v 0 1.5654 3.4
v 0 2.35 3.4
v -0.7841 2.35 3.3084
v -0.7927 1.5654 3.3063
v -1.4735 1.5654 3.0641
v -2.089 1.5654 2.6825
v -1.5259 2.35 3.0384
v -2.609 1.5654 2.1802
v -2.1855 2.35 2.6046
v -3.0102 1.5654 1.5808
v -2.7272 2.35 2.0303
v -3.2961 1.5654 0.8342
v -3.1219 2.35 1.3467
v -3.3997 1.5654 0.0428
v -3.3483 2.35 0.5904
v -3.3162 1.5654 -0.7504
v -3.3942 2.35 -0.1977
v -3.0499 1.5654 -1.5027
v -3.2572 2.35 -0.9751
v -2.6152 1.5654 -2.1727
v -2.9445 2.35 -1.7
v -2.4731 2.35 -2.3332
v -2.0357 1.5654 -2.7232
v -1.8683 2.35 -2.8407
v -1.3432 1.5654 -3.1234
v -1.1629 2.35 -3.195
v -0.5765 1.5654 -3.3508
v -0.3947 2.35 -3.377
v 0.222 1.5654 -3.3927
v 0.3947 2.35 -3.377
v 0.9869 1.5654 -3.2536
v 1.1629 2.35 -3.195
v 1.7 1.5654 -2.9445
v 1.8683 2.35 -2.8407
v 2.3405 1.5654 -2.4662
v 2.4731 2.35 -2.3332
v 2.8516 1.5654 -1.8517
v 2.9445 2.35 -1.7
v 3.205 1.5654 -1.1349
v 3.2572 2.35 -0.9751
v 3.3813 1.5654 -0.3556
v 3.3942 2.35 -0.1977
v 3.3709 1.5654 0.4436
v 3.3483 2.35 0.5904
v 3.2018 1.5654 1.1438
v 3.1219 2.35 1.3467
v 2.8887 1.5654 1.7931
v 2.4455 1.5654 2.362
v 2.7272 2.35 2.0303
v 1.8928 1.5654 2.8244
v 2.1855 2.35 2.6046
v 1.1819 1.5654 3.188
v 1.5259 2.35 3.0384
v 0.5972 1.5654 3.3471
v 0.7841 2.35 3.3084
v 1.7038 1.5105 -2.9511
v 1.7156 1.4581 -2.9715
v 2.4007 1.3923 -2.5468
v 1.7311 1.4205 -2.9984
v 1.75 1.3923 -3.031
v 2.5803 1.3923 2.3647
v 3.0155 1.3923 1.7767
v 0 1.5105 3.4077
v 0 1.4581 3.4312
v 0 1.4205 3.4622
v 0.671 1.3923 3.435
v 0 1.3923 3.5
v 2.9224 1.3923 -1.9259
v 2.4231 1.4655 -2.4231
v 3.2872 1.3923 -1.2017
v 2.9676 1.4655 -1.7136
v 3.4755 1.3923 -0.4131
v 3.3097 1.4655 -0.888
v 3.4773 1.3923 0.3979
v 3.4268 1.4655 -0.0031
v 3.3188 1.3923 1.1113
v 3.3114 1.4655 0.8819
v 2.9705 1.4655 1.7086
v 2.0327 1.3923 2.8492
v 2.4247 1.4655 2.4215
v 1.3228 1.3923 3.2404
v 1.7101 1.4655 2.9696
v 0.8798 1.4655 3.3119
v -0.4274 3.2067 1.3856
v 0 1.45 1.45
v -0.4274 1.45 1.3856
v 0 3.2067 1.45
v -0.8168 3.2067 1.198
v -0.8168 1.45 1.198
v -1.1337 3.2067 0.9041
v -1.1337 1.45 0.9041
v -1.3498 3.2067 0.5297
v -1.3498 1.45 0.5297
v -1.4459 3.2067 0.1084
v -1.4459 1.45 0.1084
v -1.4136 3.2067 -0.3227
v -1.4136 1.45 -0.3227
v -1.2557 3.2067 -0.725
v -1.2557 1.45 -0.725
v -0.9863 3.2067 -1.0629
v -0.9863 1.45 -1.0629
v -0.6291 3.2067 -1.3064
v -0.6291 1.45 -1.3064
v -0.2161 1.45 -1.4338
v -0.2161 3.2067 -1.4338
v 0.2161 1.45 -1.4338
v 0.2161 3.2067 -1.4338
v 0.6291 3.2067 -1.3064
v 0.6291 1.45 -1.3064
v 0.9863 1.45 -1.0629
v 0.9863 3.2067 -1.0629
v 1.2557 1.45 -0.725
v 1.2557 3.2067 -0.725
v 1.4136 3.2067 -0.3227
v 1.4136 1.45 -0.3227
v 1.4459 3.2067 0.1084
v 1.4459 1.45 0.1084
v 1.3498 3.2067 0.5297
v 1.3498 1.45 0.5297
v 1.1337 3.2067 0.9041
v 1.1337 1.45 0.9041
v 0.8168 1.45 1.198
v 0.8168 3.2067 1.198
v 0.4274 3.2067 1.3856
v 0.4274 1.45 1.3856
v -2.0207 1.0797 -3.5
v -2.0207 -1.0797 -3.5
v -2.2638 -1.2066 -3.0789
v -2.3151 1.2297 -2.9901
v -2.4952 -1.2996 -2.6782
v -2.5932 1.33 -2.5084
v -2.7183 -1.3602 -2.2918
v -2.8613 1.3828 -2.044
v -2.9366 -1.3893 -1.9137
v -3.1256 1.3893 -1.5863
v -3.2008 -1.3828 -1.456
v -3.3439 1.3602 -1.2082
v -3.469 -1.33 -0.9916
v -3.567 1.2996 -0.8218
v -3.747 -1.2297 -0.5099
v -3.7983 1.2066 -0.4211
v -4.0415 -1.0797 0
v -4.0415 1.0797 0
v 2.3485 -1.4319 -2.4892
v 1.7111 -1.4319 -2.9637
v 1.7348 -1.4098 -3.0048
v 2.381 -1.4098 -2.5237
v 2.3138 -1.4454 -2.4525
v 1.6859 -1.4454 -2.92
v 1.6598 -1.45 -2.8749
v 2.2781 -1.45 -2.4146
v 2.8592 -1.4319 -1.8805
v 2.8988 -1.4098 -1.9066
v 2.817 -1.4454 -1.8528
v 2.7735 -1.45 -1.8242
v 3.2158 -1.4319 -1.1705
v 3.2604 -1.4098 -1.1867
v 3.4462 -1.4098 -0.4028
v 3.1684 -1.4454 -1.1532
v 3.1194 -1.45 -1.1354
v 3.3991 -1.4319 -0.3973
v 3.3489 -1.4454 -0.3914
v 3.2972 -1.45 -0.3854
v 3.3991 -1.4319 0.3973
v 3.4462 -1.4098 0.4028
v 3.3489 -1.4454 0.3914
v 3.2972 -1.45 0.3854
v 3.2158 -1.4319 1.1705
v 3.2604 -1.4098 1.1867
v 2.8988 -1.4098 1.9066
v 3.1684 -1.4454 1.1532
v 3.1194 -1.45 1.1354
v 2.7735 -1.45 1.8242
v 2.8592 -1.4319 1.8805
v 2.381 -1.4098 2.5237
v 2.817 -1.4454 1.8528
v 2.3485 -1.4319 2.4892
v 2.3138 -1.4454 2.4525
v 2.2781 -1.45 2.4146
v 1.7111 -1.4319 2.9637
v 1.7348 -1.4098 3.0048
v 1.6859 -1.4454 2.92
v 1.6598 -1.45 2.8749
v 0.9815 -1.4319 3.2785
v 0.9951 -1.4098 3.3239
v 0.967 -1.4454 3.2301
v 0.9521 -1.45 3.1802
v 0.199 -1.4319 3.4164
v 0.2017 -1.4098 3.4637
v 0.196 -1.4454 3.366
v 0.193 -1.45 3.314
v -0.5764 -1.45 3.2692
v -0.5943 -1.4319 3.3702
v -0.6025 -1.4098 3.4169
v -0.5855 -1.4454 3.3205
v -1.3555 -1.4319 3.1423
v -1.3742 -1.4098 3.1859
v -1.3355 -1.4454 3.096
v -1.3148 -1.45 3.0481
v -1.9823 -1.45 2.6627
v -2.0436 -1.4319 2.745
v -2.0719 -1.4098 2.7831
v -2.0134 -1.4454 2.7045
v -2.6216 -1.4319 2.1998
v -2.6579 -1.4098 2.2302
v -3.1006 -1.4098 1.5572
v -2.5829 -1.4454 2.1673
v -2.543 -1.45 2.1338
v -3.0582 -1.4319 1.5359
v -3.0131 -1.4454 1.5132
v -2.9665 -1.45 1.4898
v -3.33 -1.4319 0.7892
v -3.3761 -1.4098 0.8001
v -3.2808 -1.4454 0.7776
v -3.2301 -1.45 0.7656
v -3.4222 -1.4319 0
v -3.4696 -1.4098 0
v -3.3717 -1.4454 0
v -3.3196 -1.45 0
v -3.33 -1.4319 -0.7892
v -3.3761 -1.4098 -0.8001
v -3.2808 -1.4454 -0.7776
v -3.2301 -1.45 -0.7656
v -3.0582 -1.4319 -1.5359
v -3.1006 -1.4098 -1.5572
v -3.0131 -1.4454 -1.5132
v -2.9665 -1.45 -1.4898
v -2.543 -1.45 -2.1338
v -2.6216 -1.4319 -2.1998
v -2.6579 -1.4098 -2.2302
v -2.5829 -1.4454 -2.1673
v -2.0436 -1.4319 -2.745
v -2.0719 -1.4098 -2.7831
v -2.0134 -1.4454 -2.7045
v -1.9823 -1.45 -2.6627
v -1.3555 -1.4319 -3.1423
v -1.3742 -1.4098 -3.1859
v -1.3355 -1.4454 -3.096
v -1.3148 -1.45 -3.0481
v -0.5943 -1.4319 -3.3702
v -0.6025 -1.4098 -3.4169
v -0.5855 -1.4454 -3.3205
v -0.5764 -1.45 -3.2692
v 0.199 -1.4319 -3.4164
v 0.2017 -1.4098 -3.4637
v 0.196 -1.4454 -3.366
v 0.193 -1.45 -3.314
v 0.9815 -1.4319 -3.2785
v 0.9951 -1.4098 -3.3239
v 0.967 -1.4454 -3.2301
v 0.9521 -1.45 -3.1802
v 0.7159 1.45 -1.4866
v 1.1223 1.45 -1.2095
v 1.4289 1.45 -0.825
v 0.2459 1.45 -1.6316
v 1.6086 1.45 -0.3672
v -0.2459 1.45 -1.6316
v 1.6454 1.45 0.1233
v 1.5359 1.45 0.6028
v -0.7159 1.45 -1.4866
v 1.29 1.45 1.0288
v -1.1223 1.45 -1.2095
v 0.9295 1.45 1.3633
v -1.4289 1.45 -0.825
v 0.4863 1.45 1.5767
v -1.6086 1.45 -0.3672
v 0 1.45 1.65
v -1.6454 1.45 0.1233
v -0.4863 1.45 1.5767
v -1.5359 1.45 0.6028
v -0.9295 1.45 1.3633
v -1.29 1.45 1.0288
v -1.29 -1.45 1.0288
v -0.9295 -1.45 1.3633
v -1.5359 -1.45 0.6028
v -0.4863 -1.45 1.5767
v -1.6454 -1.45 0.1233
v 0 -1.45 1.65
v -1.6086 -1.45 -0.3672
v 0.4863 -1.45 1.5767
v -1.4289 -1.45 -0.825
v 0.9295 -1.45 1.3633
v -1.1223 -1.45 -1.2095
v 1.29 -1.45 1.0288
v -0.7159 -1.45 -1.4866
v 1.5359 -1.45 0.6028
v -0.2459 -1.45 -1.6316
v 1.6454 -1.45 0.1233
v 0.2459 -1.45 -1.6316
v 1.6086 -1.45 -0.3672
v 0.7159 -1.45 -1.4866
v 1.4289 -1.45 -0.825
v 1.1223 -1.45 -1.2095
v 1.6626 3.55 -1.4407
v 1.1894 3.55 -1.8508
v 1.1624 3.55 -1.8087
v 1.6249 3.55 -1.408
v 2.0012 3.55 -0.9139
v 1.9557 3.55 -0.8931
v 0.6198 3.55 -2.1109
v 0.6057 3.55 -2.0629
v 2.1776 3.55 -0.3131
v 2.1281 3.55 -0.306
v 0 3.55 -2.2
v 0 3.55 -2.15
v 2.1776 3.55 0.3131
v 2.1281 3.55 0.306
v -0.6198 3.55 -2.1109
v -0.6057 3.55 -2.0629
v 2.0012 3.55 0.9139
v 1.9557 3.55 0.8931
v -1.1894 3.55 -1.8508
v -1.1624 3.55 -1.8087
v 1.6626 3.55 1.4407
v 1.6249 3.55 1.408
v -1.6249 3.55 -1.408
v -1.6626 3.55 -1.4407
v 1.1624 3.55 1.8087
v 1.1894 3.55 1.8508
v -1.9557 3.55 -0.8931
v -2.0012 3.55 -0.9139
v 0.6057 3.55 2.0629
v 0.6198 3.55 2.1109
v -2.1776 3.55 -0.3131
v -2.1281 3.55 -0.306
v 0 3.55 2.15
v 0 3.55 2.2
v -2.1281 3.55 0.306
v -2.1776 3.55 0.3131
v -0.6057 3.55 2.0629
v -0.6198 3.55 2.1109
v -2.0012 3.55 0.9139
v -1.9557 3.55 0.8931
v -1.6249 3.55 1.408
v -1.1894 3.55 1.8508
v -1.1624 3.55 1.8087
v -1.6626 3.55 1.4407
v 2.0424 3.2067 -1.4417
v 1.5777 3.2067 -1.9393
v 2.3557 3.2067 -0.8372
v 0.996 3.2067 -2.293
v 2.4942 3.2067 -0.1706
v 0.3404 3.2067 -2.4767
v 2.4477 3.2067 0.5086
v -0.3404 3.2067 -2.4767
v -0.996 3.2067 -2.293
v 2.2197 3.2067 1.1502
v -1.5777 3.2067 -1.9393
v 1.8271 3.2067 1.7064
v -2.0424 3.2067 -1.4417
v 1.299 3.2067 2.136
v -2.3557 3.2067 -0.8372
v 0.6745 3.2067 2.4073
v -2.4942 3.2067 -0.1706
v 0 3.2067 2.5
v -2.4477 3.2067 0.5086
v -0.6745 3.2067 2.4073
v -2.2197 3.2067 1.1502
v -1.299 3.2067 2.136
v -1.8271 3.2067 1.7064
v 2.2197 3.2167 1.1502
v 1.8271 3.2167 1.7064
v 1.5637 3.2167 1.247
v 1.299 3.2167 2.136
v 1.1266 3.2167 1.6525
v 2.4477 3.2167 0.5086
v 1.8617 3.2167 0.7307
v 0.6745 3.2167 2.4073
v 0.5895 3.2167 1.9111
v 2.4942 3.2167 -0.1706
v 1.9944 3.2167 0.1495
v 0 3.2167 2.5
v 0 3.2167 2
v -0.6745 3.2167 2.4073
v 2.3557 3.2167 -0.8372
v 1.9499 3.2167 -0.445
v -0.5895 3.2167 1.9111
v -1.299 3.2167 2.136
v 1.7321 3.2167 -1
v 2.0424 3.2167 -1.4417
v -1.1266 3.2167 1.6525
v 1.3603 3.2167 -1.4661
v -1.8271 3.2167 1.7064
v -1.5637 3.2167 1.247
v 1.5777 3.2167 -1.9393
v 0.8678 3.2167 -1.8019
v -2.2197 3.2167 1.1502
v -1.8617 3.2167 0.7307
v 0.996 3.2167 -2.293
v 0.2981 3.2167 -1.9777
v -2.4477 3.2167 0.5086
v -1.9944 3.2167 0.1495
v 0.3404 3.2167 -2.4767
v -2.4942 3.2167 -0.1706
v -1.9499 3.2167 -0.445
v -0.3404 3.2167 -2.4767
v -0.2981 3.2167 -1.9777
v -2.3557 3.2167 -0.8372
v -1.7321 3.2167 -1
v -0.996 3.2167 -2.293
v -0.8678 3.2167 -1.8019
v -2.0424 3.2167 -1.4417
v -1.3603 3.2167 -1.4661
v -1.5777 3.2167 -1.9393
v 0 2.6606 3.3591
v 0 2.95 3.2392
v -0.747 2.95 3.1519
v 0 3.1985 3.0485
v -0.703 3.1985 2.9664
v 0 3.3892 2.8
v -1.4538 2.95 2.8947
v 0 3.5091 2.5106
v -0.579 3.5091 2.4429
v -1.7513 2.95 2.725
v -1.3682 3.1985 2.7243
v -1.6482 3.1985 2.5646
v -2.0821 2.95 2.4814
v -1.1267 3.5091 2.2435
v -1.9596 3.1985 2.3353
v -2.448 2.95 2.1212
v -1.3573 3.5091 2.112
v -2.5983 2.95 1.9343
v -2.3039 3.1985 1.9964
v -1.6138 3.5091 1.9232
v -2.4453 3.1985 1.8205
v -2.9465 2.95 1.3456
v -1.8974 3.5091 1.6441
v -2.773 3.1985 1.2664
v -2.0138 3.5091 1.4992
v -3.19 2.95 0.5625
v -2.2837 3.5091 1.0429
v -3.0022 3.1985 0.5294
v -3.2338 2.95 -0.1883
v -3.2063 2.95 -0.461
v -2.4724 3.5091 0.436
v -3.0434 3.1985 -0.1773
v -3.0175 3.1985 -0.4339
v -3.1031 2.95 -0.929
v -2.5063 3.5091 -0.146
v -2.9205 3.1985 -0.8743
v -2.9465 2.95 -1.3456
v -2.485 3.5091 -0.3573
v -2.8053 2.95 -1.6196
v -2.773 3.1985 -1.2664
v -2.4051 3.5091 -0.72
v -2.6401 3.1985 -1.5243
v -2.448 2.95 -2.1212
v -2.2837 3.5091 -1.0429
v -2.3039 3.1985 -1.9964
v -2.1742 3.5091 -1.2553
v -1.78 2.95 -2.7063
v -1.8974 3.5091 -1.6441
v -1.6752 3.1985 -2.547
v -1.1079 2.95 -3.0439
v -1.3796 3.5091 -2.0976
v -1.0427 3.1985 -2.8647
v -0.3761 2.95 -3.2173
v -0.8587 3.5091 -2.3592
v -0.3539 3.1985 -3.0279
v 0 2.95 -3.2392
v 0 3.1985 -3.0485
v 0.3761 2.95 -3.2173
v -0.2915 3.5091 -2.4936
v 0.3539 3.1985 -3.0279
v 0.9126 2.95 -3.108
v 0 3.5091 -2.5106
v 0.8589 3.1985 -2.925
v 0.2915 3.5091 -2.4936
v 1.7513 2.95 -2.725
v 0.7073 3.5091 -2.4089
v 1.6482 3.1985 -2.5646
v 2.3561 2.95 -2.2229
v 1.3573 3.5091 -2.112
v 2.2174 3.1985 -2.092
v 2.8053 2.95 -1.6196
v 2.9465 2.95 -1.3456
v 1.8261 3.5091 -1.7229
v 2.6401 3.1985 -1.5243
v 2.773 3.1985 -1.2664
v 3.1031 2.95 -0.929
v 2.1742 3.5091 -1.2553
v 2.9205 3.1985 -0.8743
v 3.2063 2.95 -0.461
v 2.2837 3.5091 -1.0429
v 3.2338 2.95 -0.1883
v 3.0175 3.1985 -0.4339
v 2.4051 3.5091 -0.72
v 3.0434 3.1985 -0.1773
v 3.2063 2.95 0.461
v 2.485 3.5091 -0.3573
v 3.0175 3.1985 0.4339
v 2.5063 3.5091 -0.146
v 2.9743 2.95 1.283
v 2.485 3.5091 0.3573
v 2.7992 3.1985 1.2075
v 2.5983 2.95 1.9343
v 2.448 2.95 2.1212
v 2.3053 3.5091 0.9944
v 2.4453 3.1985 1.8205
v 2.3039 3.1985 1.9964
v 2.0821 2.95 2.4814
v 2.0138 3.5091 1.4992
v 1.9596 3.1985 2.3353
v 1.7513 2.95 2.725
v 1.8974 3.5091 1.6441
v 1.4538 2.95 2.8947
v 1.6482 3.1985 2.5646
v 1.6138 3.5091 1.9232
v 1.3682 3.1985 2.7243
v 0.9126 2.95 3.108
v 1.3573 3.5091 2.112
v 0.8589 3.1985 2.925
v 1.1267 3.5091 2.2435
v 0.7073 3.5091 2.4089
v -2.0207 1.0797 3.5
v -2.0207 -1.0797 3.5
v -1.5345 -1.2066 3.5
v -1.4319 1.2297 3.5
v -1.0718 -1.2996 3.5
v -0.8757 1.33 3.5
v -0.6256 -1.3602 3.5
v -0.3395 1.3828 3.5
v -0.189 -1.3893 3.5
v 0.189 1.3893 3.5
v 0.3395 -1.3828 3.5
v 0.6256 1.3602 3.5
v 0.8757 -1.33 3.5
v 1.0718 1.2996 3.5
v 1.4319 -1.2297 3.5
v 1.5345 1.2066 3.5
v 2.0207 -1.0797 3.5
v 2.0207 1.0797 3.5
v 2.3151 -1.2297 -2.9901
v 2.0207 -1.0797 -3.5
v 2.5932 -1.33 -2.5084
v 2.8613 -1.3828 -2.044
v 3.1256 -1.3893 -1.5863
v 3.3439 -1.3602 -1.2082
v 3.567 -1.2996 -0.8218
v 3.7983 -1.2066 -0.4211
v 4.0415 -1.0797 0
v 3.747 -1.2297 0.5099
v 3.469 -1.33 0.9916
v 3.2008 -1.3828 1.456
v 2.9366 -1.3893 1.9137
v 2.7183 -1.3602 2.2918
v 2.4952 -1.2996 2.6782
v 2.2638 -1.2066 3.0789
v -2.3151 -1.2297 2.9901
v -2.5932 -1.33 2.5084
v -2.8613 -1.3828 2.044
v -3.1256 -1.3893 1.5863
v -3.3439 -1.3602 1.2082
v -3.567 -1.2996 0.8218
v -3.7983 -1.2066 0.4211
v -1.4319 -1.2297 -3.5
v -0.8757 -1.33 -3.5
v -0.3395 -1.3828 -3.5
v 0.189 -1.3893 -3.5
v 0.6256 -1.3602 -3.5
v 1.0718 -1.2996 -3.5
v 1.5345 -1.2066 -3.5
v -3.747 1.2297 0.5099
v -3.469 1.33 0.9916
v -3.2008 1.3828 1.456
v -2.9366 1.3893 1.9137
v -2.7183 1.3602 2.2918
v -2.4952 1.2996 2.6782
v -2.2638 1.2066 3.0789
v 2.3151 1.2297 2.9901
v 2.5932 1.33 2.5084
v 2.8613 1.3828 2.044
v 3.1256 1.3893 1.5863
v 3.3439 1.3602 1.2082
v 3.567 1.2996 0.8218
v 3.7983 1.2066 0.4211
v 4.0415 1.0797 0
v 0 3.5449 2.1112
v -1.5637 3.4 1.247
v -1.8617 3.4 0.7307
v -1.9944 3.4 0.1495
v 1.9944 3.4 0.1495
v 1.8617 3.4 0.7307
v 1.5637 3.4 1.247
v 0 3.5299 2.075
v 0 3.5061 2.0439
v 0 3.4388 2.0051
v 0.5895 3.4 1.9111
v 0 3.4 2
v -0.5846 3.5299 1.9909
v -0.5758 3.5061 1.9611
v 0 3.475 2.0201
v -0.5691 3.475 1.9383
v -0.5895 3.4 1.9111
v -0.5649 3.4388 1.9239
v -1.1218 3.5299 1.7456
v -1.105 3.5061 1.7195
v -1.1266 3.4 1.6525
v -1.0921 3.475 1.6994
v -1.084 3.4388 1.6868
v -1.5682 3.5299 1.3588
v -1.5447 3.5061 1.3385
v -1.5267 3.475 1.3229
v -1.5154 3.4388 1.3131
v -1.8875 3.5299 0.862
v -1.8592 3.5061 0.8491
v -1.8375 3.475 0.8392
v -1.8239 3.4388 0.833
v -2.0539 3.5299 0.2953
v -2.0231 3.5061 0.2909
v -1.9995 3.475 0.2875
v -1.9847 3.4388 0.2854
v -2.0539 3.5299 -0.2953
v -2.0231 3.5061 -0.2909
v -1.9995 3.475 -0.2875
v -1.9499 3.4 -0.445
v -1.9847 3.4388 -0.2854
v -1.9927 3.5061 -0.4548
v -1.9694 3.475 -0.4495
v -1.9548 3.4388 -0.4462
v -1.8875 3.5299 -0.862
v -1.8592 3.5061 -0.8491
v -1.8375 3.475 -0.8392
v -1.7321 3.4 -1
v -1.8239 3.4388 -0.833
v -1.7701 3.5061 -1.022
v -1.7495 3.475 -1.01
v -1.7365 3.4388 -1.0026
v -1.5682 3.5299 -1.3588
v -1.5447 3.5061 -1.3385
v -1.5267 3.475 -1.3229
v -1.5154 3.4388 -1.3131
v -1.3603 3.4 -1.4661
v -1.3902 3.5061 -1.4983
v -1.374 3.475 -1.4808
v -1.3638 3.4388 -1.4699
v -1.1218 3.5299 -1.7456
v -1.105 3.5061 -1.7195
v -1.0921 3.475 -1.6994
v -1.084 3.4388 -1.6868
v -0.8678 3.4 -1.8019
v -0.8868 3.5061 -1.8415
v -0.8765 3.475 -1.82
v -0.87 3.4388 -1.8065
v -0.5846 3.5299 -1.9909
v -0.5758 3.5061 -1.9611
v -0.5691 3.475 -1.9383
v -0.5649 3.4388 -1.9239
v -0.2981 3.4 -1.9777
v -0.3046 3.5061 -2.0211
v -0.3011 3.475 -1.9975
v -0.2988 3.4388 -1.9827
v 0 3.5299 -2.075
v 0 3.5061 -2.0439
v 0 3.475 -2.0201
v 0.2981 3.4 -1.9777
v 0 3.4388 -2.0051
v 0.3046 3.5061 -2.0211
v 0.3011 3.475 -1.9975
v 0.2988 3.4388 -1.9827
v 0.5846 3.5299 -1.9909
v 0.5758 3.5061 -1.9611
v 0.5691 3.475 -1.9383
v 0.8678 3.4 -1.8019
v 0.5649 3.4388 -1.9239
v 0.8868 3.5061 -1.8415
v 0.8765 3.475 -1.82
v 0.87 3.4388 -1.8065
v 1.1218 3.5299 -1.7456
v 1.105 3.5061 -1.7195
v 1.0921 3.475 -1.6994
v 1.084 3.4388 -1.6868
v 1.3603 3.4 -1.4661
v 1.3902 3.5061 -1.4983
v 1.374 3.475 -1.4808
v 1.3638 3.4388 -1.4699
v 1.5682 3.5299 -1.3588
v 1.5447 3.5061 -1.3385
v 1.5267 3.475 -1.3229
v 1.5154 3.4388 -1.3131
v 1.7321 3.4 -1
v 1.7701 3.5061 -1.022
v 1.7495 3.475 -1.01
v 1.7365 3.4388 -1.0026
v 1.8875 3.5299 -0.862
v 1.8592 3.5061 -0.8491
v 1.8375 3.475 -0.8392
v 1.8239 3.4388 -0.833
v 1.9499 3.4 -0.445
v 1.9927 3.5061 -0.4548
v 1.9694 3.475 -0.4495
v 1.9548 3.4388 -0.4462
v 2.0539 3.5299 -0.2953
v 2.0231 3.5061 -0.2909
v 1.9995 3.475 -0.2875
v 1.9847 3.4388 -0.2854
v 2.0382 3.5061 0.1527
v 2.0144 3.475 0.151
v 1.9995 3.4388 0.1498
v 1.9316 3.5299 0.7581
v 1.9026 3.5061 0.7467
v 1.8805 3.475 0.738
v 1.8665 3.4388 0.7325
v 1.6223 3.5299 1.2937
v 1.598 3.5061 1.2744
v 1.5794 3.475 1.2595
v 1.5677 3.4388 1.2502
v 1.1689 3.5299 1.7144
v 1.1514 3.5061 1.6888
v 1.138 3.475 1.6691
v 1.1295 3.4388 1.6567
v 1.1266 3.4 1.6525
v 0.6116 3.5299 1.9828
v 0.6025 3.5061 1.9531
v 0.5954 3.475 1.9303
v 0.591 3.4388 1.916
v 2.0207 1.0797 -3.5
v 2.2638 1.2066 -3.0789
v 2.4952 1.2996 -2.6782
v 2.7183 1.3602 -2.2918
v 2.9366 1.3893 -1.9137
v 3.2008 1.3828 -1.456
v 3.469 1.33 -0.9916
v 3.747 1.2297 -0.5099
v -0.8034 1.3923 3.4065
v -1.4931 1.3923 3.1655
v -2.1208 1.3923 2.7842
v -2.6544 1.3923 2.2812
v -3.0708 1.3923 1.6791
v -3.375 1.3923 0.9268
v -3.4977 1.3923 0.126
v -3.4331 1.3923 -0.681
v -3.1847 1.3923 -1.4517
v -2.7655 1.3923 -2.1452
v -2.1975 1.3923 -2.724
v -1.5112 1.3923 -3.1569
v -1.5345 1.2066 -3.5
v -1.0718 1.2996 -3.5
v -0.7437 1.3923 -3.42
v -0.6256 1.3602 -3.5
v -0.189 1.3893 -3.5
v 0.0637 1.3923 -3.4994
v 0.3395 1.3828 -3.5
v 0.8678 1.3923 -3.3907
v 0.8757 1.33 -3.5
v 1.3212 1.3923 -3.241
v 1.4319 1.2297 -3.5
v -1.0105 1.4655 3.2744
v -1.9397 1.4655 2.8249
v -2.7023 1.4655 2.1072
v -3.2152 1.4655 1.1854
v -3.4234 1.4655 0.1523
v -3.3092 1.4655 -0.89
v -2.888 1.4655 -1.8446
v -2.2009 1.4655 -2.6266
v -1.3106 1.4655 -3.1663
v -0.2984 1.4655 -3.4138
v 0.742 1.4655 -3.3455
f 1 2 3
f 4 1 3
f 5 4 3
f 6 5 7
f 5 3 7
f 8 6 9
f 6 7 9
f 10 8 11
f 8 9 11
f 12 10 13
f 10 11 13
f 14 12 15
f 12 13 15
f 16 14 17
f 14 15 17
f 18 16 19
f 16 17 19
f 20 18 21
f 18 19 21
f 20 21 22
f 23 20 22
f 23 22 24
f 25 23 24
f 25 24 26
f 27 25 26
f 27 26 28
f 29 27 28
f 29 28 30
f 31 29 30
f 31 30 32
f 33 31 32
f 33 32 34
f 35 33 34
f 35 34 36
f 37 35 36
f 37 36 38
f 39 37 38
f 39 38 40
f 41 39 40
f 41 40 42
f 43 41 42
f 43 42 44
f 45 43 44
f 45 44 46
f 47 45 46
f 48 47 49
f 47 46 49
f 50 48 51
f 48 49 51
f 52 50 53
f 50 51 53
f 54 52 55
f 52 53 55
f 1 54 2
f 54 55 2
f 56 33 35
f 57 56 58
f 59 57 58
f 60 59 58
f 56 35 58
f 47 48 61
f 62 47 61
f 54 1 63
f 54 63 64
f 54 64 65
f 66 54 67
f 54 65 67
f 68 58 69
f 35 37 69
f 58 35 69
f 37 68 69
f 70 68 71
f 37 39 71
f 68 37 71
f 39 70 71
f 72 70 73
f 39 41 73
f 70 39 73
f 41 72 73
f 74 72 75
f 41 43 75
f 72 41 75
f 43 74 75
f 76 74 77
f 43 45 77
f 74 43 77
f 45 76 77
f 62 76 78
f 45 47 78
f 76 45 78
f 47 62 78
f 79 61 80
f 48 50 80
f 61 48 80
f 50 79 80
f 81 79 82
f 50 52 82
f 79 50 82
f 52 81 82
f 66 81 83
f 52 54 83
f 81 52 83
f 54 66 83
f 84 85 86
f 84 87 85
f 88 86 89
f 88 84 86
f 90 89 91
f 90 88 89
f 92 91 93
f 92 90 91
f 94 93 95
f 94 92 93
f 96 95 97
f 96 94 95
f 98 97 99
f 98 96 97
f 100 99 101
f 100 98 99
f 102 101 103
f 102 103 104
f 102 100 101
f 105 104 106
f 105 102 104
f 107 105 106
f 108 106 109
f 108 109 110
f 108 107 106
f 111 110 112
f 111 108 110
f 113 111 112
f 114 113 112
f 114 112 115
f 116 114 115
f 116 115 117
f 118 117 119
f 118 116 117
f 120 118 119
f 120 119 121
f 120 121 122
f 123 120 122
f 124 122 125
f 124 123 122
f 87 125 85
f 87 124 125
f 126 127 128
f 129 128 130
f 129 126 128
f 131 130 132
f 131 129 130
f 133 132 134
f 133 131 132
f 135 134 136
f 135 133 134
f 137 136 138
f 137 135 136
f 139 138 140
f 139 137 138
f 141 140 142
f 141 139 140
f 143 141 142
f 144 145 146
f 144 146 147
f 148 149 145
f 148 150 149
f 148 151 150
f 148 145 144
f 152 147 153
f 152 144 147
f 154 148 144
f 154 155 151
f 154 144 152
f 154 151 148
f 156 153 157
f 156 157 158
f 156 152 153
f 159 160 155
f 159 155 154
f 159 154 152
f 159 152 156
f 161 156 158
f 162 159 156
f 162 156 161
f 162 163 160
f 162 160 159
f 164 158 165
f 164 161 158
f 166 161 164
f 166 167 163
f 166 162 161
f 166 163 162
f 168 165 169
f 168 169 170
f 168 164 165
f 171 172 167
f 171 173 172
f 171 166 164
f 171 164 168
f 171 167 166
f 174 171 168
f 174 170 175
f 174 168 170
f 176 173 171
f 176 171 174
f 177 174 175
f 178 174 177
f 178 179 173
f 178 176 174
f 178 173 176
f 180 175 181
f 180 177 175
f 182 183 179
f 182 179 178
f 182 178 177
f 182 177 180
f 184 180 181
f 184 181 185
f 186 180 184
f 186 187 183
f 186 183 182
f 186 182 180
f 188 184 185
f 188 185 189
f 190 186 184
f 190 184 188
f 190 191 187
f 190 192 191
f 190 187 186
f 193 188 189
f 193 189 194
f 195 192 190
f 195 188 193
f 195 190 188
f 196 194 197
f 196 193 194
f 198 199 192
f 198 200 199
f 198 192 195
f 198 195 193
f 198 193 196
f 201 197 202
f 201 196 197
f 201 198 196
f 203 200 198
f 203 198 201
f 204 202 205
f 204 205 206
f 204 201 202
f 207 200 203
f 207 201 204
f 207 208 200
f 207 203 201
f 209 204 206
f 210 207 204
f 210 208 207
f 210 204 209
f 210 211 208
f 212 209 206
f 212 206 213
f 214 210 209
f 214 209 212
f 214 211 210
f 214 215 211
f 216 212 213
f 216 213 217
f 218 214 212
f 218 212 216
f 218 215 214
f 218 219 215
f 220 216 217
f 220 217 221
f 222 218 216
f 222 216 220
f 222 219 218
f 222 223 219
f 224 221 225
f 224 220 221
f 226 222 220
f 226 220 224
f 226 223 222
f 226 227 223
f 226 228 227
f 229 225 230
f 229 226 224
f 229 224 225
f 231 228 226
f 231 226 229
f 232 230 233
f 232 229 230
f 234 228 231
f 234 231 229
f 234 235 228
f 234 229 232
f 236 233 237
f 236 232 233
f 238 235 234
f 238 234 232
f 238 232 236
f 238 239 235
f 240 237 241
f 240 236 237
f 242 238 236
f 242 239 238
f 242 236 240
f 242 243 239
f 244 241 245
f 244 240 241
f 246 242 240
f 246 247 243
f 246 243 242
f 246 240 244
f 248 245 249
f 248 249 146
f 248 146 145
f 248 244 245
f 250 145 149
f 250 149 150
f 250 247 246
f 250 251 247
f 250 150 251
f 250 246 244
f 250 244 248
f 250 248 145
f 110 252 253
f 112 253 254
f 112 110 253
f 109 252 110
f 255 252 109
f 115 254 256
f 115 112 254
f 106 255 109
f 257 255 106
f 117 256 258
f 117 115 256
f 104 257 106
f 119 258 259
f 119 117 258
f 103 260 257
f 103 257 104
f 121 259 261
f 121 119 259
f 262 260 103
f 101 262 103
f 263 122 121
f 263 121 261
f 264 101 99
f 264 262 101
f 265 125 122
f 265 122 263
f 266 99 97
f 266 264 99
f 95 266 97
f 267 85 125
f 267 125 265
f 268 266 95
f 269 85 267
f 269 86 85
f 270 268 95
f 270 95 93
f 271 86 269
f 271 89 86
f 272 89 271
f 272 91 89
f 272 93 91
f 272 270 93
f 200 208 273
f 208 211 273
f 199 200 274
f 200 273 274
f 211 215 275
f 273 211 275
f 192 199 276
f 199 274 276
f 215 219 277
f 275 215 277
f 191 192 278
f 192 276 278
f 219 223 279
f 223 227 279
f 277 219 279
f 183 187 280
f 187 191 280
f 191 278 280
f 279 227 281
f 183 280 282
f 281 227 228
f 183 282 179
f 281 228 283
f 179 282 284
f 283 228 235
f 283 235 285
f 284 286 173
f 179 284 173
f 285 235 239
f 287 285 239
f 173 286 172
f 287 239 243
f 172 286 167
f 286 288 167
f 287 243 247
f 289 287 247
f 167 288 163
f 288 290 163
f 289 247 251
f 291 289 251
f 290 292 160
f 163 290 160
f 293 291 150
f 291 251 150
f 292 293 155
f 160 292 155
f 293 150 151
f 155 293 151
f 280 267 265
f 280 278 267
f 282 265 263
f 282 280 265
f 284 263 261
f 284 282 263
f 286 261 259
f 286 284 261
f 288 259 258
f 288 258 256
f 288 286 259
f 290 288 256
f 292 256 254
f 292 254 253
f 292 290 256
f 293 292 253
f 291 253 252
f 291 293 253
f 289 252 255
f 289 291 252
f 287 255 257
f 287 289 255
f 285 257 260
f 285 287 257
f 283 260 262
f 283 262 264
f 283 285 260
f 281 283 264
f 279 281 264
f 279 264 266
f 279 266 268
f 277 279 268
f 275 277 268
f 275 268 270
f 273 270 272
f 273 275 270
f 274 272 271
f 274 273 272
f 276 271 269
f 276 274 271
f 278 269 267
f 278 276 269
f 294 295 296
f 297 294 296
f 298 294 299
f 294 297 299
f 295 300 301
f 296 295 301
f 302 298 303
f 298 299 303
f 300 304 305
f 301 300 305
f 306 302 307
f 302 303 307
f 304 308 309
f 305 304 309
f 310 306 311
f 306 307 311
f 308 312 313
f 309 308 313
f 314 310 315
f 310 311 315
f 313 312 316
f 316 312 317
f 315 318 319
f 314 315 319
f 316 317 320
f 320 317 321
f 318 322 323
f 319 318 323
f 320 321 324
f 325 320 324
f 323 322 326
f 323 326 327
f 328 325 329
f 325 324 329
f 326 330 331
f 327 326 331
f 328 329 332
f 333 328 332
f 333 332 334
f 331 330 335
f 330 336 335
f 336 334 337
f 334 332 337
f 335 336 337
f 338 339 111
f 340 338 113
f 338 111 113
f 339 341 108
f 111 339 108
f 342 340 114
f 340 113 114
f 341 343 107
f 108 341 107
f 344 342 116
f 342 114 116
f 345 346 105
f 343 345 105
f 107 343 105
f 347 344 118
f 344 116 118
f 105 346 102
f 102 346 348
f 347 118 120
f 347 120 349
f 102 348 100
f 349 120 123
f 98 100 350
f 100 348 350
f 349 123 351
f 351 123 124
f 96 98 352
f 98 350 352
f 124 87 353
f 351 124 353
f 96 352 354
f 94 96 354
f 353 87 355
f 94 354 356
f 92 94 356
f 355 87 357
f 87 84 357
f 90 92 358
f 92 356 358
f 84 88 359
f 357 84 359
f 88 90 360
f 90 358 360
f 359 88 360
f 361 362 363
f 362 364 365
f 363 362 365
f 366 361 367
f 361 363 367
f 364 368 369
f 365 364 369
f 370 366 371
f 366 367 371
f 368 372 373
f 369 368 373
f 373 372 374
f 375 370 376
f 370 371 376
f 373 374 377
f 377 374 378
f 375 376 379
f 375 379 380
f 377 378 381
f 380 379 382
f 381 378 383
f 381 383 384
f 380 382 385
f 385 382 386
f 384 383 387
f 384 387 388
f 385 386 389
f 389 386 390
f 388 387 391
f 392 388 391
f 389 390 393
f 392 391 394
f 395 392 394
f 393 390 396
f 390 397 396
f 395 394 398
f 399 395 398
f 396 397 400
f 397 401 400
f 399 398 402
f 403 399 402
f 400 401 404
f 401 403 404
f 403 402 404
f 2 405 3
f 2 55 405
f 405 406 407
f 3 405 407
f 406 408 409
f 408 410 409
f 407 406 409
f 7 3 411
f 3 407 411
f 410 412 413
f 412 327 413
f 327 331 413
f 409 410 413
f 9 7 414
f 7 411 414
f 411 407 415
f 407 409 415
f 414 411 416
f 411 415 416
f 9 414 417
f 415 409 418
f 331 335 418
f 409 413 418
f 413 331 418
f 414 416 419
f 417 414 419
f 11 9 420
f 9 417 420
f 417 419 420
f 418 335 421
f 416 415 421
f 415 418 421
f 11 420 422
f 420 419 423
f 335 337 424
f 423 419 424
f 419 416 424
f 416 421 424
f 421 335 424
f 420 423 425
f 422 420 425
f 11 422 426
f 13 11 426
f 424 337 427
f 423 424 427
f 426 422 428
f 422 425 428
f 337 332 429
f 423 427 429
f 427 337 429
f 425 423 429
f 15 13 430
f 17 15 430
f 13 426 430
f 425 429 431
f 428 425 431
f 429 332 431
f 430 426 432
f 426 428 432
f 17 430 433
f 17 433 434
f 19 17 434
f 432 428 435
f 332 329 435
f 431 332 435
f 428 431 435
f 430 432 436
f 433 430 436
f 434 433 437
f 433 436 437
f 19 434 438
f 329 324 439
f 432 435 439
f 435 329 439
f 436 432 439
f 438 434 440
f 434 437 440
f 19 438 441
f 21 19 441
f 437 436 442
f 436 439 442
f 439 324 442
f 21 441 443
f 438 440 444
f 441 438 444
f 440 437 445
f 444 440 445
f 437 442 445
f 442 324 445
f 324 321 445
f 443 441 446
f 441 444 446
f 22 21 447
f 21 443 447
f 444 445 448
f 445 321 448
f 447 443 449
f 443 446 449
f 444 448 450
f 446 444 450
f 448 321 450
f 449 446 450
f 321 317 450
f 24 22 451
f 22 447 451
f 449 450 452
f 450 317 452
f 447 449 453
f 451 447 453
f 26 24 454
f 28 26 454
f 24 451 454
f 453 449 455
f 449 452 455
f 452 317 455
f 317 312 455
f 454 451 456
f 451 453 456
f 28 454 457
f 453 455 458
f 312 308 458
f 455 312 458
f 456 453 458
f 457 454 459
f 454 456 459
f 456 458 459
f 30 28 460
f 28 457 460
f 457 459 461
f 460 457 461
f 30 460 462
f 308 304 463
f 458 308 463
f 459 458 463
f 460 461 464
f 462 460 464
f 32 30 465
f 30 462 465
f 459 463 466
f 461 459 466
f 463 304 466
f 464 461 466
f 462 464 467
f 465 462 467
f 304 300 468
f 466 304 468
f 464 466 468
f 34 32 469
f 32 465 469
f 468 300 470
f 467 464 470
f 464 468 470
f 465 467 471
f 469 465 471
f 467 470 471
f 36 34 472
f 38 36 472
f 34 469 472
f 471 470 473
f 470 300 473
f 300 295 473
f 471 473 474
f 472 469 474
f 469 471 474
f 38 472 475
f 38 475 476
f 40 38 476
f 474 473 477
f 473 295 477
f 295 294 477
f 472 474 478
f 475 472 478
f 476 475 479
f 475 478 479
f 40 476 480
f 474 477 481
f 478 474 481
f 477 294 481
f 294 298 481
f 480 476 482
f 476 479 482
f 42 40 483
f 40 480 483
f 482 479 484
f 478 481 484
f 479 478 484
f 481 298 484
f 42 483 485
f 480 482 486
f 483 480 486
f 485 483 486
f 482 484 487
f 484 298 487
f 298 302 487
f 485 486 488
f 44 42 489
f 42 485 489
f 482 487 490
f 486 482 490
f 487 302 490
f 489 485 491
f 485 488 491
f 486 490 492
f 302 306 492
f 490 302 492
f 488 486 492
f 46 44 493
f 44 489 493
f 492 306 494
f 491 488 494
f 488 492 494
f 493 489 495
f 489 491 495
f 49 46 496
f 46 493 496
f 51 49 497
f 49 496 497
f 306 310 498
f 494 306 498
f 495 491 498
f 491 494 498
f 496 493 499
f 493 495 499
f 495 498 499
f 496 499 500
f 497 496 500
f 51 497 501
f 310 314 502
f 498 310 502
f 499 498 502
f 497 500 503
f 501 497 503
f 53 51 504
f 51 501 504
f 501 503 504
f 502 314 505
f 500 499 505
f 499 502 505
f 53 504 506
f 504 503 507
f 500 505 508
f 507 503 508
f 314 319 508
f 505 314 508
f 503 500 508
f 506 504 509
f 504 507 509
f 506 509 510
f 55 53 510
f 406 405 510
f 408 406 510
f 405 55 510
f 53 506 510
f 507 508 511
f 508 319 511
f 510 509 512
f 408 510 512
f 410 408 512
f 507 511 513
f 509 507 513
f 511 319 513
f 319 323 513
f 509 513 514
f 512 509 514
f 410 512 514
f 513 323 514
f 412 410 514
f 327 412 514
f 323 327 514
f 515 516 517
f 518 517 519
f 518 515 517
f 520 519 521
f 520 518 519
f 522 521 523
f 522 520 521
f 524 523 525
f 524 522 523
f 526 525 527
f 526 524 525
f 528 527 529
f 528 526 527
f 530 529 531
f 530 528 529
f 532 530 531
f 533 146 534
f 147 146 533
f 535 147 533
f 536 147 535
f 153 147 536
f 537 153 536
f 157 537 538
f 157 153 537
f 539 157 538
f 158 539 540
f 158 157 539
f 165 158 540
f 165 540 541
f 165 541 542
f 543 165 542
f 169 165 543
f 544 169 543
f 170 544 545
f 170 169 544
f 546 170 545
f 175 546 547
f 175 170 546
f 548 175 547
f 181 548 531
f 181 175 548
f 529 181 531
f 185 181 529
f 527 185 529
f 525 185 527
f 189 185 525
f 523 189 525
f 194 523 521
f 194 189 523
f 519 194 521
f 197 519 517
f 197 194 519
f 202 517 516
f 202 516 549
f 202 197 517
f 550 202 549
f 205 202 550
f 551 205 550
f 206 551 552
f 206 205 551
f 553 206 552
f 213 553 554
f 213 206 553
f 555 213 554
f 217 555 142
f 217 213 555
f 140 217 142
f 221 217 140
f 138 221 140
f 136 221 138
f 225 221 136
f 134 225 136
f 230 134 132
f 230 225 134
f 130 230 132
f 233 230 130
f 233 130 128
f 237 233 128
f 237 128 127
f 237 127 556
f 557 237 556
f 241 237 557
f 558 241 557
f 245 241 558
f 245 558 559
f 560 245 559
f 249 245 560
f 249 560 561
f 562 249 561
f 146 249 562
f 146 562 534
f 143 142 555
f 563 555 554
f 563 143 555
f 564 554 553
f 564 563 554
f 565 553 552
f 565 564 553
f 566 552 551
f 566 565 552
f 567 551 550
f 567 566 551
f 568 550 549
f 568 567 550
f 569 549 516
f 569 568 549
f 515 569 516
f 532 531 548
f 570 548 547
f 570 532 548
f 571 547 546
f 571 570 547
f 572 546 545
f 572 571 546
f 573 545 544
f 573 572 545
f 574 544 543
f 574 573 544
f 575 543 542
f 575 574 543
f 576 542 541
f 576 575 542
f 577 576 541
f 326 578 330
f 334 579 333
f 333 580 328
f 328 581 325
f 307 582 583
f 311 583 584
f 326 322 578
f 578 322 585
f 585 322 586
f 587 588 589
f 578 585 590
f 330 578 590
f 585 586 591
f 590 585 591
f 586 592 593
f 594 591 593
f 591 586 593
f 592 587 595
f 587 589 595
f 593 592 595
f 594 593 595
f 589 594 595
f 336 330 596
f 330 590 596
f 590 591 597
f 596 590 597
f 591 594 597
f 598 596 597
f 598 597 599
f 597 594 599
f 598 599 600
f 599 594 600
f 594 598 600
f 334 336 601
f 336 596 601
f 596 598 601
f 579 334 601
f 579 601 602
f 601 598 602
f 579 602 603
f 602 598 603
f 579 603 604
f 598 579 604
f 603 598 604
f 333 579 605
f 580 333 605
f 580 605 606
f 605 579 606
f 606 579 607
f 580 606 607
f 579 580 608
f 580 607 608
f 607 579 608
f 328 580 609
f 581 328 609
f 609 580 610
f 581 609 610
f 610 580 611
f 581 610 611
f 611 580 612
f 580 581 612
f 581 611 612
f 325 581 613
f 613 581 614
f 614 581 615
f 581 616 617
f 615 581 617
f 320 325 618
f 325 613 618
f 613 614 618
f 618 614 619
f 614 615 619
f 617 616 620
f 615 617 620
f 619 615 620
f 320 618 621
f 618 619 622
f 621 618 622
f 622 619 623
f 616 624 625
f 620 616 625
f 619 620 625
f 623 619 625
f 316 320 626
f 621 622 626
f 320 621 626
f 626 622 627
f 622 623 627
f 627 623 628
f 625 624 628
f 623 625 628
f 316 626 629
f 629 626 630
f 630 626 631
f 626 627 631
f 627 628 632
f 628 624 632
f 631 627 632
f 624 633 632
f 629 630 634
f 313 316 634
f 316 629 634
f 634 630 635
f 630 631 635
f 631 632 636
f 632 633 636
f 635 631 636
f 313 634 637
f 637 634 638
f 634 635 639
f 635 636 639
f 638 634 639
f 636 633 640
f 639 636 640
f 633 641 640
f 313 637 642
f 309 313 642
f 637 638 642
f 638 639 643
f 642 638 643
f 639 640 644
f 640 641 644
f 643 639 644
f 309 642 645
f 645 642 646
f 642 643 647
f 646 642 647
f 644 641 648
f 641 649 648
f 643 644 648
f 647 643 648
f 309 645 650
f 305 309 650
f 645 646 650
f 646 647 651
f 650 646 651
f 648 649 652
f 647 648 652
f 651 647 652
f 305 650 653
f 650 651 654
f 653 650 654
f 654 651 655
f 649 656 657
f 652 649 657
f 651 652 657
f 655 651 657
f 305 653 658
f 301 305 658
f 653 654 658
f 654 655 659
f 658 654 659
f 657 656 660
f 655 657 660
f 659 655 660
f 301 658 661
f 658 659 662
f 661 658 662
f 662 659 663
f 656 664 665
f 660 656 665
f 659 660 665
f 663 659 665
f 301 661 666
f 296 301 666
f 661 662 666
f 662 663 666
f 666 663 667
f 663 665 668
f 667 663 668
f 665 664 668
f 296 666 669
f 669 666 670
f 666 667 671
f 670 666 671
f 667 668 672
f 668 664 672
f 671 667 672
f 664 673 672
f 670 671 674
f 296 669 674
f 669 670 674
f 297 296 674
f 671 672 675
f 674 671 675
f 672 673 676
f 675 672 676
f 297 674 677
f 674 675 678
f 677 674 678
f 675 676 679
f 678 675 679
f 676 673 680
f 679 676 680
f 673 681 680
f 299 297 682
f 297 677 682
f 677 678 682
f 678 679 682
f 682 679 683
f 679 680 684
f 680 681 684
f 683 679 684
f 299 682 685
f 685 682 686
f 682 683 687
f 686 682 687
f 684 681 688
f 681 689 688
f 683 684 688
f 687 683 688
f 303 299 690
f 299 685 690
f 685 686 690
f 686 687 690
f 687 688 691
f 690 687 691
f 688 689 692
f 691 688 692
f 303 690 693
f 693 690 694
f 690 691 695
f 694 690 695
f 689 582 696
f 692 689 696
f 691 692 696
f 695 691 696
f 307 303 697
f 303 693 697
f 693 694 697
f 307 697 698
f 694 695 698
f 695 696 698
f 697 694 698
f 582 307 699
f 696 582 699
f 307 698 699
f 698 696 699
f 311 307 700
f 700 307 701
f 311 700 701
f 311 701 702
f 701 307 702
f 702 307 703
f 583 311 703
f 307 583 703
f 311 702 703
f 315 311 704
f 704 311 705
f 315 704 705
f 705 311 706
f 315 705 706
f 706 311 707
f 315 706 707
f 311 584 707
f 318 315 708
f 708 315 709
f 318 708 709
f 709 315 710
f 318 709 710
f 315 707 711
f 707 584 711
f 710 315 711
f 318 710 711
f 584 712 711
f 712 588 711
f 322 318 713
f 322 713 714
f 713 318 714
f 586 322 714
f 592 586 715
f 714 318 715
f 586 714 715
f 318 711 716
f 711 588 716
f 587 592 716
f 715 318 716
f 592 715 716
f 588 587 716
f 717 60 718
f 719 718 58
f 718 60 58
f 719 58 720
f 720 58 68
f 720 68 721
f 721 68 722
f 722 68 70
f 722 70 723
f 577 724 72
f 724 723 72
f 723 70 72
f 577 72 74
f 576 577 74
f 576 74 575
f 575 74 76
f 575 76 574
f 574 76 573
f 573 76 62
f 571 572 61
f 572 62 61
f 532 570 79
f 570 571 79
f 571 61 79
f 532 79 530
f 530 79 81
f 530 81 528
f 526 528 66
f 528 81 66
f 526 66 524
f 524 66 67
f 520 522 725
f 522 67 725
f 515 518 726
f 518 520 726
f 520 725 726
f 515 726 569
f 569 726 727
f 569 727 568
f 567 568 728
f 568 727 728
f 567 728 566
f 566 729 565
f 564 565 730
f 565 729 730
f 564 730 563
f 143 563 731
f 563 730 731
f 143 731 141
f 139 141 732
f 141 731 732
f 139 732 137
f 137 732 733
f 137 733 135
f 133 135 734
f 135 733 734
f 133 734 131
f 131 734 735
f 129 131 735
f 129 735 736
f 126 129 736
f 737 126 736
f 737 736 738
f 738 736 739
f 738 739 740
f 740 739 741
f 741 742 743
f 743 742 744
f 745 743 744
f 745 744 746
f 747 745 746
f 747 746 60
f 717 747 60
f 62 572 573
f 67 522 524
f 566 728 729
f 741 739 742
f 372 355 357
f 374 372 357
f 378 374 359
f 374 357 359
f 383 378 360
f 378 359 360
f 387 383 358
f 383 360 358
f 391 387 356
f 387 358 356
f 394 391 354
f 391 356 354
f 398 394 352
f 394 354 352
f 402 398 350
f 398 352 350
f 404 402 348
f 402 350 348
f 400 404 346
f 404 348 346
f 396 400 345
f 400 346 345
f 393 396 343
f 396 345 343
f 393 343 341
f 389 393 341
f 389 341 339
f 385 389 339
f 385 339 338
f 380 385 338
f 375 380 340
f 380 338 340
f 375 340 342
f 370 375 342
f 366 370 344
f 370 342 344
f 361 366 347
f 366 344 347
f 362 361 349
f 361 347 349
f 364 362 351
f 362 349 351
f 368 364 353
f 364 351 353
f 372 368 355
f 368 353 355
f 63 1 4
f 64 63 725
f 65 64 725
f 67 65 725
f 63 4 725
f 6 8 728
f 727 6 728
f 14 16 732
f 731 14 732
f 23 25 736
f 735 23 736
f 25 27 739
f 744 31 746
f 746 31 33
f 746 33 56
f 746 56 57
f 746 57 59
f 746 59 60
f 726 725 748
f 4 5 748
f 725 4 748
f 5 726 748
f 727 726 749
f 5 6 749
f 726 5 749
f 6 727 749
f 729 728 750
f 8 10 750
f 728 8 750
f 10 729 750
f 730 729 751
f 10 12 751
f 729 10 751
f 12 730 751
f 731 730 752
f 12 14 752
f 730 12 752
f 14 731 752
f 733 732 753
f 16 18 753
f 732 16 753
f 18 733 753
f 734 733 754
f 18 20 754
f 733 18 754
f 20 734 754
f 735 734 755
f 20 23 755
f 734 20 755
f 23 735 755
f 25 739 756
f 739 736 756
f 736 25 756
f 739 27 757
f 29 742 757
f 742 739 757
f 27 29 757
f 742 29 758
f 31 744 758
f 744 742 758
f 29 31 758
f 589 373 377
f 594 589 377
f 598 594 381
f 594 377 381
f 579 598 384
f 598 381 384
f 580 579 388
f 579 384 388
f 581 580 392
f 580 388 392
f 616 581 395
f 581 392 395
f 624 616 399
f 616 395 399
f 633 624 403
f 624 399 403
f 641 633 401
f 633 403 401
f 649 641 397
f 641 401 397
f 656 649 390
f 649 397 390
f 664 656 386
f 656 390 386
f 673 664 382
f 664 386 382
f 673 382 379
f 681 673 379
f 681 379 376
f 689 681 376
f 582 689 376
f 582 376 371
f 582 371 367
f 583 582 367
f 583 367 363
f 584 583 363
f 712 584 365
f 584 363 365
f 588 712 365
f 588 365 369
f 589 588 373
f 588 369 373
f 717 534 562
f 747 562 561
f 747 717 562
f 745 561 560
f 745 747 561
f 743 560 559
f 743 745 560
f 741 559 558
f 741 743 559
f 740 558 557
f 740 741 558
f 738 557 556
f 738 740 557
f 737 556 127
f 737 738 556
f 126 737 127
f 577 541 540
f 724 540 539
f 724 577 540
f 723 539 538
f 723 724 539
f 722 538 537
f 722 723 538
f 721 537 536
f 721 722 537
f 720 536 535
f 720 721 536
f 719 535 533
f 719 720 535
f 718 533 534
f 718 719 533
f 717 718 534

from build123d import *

# Parameters (mm, degrees)
SKETCH_1_R      = 1.65
EXTRUDE_1_DEPTH = 1.45
SKETCH_5_W      = 1.05
SKETCH_5_H      = 1.756666667
FILLET_1_R      = 1.2
FILLET_3_R      = 0.15
FILLET_4_R      = 0.2
FILLET_5_R      = 0.3


with BuildPart() as part:
    # 草图1 → 凸台-拉伸1 (new, symmetric)
    with BuildSketch(Plane(origin=(0, 0, 0), x_dir=(1, 0, 0), z_dir=(0, 1, 0))):
        Polygon((4.041451884, 0), (2.020725942, 3.5), (-2.020725942, 3.5), (-4.041451884, 0), (-2.020725942, -3.5), (2.020725942, -3.5), align=None)
        with Locations(Location((0, 0, 0), (0, 0, 270))):
            Circle(SKETCH_1_R, mode=Mode.SUBTRACT)
    extrude(amount=EXTRUDE_1_DEPTH, both=True)

    # 草图4 → 旋转1 (revolve)
    with BuildSketch(Plane(origin=(0, 0, 0), x_dir=(0, 0, -1), z_dir=(1, 0, 0))):
        Polygon((-3.4, 1.45), (-3.4, 3.55), (-2, 3.55), (-2, 3.216666667), (-2.5, 3.216666667), (-2.5, 1.45), align=None)
    revolve(axis=Axis((0, 2.804536462, 0), (0, -1, 0)))

    # 草图5 → 旋转2 (revolve)
    with BuildSketch(Plane(origin=(0, 0, 0), x_dir=(0, 0, -1), z_dir=(1, 0, 0))):
        with Locations((-1.975, 2.328333334)):
            Rectangle(SKETCH_5_W, SKETCH_5_H)
    revolve(axis=Axis((0, 2.51357275, 0), (0, -1, 0)))

    # 圆角1
    fillet_1_edges = [part.edges().sort_by_distance(p)[0] for p in [
        (0, 3.55, -3.4),
    ]]
    fillet(fillet_1_edges, radius=FILLET_1_R)

    # 圆角3
    fillet_3_edges = [part.edges().sort_by_distance(p)[0] for p in [
        (0, 3.55, -2),
    ]]
    fillet(fillet_3_edges, radius=FILLET_3_R)

    # 草图6 → 切除-旋转1 (revolve, cut)
    with BuildSketch(Plane(origin=(0, 0, 0), x_dir=(0, 0, -1), z_dir=(1, 0, 0)), mode=Mode.PRIVATE) as cut_revolve_1_sk:
        Polygon((3.4, 1.45), (5.824871131, 1.45), (5.824871131, 0.05), align=None)
        Polygon((5.824871131, -0.05), (3.4, -1.45), (5.824871131, -1.45), align=None)
    revolve(cut_revolve_1_sk.sketch.rotate(Axis((0, 2.537572, 0), (0, -1, 0)), 30.000000005), axis=Axis((0, 2.537572, 0), (0, -1, 0)), mode=Mode.SUBTRACT)

    # 圆角4
    fillet_4_edges = [part.edges().sort_by_distance(p)[0] for p in [
        (3.284147809, 1.45, 0.879984753),
    ]]
    fillet(fillet_4_edges, radius=FILLET_4_R - 0.0001)  # a hair under: the kernel refuses the full size

    # 圆角5
    fillet_5_edges = [part.edges().sort_by_distance(p)[0] for p in [
        (-1.7, -1.45, 2.944486373),
    ]]
    fillet(fillet_5_edges, radius=FILLET_5_R)


solid = part.part
